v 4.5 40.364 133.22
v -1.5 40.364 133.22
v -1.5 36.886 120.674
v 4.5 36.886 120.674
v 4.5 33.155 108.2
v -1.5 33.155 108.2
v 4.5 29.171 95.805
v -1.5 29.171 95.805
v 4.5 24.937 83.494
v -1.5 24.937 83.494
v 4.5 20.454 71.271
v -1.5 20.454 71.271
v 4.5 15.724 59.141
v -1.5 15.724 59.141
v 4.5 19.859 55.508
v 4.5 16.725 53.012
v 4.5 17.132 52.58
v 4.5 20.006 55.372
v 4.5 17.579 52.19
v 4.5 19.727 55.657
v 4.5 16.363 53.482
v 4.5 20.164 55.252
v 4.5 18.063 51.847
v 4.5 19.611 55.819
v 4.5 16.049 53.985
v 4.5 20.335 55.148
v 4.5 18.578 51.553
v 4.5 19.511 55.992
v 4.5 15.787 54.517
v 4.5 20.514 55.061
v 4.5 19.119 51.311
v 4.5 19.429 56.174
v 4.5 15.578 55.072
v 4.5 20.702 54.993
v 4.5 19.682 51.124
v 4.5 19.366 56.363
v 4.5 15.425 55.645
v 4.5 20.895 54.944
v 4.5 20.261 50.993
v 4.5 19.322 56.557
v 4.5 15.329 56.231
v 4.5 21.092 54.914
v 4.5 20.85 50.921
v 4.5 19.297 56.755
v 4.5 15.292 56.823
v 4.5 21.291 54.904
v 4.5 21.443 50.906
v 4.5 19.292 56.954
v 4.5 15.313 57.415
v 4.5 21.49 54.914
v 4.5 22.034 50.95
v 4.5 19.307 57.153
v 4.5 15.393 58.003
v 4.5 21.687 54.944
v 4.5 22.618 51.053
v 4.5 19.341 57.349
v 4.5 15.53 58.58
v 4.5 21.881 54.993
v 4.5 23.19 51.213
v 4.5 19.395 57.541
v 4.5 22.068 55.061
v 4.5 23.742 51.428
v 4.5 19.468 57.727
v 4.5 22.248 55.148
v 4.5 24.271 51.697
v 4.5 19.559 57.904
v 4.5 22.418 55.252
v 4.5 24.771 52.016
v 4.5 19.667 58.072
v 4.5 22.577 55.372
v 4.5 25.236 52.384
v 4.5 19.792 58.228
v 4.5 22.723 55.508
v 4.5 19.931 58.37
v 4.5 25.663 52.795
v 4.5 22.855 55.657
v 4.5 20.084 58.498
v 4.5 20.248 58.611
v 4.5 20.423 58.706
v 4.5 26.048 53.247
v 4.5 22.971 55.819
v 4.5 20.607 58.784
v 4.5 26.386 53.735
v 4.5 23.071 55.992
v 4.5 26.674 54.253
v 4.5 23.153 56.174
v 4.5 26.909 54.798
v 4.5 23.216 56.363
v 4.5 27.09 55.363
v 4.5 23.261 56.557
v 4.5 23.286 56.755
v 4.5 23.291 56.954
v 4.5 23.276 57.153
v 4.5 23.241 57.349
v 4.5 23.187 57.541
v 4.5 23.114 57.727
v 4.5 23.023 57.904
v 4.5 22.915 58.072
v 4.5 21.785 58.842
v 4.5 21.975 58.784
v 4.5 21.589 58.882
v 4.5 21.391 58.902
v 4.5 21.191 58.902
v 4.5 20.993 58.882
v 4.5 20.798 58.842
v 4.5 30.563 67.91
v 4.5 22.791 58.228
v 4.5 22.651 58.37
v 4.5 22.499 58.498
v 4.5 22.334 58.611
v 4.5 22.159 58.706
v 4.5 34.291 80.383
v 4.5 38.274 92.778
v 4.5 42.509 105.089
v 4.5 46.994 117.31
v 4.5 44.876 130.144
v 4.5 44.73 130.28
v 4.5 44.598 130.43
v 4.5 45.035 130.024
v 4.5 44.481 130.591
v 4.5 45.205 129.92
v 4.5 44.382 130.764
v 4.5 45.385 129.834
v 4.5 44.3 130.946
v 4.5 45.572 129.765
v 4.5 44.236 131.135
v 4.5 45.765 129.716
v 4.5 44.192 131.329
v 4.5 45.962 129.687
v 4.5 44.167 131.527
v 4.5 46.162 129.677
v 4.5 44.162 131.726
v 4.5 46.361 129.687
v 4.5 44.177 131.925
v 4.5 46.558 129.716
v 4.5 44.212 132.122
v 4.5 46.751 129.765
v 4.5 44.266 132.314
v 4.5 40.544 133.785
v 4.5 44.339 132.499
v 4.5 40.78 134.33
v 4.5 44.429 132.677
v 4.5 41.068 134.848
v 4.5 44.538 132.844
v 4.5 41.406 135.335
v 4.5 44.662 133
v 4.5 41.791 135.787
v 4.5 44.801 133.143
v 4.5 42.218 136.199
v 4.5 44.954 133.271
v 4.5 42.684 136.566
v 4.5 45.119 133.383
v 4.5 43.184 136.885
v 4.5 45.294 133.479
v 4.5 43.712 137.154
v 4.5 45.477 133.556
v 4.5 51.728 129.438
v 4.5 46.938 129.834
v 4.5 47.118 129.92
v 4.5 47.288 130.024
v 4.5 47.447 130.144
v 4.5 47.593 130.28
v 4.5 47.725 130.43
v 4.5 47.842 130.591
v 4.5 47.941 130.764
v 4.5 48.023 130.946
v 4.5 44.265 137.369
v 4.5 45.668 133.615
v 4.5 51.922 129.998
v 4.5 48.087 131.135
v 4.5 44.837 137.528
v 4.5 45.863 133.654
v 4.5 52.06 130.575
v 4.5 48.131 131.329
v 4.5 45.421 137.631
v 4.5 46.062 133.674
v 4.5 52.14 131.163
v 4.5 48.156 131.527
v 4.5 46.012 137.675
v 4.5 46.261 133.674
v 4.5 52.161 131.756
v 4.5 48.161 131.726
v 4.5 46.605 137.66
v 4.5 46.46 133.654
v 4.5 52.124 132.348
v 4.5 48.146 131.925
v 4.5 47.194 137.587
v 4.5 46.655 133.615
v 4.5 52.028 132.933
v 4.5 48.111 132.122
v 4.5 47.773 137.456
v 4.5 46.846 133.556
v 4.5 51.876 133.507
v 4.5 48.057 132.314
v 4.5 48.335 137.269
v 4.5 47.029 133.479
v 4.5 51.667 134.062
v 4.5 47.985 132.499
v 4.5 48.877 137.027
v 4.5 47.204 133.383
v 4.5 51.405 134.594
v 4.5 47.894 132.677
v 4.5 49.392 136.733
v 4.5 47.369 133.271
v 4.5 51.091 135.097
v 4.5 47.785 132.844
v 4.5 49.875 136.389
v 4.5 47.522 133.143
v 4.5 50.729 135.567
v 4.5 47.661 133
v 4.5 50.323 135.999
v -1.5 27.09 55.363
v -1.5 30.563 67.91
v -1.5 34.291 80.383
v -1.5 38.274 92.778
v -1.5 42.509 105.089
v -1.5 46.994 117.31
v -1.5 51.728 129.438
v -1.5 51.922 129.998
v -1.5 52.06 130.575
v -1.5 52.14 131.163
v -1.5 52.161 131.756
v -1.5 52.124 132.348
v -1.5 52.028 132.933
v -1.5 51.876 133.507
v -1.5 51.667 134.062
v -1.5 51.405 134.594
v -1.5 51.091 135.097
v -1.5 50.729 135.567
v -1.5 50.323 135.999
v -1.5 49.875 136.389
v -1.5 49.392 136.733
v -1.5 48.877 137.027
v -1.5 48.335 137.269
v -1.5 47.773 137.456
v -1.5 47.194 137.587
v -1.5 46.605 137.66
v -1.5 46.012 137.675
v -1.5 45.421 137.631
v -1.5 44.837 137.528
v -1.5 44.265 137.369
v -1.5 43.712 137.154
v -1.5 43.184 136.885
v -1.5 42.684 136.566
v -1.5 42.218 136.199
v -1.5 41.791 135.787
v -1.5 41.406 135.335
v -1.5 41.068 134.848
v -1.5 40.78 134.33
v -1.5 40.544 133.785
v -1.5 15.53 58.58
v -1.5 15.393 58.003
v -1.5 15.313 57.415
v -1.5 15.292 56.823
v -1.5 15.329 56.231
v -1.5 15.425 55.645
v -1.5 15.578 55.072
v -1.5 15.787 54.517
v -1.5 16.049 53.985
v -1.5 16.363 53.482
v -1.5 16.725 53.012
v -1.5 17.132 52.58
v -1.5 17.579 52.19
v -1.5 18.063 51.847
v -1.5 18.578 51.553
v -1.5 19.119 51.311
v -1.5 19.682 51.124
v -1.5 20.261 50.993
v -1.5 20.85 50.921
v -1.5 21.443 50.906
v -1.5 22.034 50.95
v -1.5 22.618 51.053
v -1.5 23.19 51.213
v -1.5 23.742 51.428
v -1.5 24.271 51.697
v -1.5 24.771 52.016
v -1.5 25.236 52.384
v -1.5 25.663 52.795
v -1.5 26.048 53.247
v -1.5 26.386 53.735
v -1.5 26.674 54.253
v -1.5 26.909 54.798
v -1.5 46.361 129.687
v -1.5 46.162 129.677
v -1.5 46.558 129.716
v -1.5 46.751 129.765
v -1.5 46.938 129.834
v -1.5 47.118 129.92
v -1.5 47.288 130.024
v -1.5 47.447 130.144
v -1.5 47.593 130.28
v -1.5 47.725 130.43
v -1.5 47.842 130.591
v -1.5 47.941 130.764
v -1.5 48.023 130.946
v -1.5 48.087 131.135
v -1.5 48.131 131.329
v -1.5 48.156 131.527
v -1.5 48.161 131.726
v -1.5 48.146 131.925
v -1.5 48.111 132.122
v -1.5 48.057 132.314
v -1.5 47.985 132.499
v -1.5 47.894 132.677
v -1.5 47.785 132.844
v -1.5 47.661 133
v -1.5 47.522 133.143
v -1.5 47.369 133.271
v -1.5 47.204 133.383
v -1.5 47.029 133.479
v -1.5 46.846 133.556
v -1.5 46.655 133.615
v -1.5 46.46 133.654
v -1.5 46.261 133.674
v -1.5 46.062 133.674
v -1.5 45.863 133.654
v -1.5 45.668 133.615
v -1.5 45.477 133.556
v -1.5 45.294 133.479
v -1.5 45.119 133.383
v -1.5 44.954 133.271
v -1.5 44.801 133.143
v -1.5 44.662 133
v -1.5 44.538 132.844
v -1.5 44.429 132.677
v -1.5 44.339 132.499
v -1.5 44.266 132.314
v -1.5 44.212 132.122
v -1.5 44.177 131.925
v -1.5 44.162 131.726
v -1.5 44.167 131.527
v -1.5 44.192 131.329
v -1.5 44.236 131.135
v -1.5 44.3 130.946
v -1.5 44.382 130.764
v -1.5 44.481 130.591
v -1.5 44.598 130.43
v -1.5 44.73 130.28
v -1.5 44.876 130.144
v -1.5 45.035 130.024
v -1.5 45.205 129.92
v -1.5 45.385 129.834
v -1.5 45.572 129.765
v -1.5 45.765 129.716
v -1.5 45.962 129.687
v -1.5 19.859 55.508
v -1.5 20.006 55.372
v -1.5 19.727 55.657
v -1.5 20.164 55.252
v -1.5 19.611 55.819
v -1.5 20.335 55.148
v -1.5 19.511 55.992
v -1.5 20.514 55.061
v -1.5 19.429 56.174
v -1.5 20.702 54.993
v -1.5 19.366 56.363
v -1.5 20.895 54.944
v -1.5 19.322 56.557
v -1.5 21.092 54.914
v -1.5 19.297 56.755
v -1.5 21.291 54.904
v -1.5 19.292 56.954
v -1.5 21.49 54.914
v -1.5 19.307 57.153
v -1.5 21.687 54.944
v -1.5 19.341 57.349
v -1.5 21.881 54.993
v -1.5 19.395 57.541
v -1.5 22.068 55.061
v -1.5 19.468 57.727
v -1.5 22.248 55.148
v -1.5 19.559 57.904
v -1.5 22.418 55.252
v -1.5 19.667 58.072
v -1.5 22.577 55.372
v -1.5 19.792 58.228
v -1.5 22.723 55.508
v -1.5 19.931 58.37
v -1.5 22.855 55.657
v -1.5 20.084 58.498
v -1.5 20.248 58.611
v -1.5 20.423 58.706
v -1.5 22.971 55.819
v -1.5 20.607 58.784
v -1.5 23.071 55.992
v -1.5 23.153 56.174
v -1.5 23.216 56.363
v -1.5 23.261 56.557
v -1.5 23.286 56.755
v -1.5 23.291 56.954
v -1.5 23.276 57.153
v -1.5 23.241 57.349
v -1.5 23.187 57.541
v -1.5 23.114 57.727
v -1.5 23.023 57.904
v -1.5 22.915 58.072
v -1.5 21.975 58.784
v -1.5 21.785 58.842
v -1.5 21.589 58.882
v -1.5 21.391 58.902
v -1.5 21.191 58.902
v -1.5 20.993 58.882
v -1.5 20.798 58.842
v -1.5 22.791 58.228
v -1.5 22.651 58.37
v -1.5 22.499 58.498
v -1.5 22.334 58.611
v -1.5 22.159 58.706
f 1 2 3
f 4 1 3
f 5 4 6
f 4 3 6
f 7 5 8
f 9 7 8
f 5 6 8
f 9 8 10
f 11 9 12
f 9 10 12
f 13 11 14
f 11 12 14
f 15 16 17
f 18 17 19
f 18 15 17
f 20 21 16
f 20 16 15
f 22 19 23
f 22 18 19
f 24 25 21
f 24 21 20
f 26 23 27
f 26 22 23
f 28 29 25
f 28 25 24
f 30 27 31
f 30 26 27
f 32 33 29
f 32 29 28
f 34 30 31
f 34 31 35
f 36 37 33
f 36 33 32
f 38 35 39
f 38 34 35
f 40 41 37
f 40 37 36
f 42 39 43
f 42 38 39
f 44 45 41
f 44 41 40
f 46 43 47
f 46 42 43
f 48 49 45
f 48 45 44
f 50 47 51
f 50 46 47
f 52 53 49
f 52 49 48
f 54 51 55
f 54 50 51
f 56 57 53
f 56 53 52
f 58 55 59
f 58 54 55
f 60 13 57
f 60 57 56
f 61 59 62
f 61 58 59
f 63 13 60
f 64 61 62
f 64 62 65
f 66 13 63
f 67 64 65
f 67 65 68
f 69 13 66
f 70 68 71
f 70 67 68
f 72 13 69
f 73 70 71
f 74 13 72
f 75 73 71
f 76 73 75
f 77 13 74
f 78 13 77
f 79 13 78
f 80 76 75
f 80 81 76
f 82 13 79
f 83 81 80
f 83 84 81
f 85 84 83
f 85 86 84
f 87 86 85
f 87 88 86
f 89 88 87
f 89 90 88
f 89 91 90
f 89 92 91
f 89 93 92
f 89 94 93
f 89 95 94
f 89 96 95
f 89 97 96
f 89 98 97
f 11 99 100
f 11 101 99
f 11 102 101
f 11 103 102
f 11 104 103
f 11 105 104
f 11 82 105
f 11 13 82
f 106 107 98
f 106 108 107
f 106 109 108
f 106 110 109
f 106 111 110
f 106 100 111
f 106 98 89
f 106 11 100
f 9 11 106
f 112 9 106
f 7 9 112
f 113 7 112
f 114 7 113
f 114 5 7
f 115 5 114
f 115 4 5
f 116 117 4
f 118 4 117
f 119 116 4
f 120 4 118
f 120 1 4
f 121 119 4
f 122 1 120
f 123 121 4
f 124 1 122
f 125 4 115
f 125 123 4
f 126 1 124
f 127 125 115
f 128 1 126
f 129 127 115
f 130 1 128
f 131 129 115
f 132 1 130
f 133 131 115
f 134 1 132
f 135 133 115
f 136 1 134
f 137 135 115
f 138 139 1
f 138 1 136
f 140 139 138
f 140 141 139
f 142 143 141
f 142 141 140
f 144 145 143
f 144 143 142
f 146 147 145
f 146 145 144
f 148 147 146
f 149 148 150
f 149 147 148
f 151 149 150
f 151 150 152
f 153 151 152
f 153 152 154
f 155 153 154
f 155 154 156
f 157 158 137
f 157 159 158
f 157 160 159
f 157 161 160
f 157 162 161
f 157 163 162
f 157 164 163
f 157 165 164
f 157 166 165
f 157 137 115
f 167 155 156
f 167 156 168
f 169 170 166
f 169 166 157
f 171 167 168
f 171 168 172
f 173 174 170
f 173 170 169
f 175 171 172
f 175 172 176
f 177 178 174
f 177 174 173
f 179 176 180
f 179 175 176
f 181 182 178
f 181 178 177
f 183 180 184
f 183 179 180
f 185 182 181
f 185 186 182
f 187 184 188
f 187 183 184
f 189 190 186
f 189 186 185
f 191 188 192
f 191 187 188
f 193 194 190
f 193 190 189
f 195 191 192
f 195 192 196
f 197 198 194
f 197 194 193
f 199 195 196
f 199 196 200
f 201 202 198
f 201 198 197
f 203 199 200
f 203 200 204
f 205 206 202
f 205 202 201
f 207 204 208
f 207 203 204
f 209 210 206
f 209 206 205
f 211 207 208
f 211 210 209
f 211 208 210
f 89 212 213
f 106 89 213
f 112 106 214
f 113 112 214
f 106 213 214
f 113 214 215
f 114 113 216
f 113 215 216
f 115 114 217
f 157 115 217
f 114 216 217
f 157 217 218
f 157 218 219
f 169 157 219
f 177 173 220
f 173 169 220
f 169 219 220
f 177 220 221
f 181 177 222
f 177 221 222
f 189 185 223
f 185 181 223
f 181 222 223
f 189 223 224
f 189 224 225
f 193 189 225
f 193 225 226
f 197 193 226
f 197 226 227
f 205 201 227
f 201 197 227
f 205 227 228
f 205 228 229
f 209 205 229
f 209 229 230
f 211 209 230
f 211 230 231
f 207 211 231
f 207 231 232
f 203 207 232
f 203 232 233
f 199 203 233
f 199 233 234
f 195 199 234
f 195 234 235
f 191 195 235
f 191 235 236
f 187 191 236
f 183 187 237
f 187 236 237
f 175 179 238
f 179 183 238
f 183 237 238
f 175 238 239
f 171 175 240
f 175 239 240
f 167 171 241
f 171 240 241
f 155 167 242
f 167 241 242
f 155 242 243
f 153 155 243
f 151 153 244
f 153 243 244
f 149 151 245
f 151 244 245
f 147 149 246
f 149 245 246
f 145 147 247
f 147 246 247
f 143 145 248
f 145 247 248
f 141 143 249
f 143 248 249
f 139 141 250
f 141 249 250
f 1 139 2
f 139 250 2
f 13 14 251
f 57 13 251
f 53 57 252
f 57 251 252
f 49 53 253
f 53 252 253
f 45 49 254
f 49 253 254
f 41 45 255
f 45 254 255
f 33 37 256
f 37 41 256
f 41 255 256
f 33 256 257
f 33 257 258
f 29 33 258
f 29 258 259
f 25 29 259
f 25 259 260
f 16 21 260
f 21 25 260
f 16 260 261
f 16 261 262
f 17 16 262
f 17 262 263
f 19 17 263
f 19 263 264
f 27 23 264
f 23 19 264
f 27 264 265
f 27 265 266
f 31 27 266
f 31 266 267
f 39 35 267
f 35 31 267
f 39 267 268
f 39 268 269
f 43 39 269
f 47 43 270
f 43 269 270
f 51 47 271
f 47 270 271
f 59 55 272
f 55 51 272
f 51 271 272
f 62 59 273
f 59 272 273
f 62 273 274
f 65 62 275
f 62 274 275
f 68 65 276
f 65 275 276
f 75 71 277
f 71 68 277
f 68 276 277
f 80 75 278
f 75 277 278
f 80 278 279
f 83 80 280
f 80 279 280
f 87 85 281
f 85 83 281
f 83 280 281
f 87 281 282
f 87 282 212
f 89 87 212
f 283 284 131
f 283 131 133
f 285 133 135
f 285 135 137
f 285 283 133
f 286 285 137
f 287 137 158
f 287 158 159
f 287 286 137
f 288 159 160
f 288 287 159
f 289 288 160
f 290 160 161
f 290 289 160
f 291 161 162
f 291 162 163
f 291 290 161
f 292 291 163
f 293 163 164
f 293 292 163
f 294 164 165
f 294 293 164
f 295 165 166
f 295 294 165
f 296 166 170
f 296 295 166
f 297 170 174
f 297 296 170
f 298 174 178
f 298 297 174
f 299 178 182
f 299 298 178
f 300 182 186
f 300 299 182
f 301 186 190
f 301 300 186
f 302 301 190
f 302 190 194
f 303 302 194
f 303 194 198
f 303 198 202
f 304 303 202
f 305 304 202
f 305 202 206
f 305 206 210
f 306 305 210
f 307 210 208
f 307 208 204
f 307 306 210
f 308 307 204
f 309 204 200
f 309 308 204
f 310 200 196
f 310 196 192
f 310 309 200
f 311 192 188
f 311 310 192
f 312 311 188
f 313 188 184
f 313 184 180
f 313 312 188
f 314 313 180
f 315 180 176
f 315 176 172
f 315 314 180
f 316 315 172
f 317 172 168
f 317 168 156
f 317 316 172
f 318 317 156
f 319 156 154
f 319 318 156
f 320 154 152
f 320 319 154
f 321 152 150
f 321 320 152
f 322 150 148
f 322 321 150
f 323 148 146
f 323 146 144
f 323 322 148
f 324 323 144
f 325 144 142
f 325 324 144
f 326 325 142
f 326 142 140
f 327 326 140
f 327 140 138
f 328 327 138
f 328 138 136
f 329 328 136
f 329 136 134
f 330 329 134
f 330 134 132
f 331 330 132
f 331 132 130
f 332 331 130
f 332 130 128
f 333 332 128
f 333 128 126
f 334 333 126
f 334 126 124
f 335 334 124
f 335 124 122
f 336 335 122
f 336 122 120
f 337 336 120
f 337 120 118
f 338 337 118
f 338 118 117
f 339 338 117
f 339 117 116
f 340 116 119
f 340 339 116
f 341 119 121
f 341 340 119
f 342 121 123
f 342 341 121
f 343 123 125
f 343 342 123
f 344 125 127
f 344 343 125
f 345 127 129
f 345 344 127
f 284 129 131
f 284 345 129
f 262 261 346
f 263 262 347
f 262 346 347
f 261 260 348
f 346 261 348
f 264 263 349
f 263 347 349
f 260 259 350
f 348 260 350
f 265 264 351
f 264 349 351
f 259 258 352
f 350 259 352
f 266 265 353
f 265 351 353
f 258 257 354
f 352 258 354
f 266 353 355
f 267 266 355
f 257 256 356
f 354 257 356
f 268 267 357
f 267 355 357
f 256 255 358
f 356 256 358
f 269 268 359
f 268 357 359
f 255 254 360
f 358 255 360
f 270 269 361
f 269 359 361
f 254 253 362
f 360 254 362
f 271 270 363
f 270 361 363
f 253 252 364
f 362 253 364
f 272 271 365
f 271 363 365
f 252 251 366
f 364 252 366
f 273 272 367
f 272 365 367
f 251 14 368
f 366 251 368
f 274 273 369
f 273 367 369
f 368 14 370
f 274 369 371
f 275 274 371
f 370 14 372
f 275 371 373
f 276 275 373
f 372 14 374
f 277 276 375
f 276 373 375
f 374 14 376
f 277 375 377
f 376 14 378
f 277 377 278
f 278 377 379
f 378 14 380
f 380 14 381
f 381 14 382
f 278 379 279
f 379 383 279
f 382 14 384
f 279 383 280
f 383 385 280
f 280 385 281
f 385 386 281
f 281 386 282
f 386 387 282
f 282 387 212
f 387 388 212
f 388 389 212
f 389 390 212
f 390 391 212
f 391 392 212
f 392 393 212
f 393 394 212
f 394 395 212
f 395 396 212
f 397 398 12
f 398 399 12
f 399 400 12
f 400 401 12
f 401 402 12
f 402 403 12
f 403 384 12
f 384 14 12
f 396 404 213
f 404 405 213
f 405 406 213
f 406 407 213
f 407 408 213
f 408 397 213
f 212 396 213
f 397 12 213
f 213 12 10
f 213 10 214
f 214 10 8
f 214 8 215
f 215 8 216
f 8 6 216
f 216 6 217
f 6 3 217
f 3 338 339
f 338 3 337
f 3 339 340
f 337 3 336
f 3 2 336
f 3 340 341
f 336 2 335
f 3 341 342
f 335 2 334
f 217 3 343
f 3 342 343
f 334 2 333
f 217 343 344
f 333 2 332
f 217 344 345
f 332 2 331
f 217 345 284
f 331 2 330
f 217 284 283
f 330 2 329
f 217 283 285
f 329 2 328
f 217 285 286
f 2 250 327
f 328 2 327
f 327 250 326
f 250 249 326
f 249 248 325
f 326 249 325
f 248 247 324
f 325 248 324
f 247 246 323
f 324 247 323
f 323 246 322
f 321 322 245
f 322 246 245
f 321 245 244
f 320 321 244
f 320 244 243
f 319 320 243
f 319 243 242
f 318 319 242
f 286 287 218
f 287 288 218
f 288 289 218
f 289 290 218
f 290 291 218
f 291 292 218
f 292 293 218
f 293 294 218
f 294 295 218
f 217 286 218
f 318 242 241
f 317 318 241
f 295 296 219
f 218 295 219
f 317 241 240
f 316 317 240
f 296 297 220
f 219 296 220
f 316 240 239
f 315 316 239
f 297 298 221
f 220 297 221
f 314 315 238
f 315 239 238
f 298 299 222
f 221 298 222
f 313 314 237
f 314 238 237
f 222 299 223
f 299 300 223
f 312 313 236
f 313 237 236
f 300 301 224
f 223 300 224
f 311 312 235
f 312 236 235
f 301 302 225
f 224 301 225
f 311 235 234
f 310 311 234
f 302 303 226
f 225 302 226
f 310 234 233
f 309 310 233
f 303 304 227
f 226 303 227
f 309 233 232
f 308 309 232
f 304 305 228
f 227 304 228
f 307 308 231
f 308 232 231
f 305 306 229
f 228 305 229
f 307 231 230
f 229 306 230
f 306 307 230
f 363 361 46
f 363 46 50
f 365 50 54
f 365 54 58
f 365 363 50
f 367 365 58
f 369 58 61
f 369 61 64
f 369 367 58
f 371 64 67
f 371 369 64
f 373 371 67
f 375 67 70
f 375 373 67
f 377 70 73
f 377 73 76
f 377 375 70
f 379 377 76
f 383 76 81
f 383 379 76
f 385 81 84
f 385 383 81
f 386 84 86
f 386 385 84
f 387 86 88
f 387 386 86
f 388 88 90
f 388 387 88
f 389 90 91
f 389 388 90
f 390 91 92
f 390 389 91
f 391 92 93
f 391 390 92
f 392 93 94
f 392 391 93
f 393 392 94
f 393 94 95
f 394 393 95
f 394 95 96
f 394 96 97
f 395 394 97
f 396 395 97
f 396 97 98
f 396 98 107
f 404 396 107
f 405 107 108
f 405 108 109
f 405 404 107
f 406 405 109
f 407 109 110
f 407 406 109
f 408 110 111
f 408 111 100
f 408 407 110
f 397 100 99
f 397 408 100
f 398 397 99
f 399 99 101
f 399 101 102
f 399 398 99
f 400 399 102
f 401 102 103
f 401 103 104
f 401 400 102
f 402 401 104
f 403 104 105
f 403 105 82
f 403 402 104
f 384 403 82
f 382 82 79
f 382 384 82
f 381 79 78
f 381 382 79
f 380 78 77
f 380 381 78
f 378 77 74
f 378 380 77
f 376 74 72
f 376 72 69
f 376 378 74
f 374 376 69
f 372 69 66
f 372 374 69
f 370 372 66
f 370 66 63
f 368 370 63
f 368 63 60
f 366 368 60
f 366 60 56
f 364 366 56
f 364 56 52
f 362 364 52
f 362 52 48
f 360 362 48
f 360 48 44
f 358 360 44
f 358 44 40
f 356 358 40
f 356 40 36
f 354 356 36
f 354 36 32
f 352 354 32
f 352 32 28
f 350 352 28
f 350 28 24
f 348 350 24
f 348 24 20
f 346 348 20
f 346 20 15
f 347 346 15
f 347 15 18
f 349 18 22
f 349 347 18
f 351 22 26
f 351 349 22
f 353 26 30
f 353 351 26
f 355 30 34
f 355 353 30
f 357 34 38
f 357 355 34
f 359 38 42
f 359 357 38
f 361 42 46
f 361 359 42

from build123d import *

# Parameters (mm, degrees)
SKETCH2_R               = 1
BOSS_EXTRUDE2_DEPTH     = 3
SCALE1_SCALE            = 2
CUT_EXTRUDE1_DEPTH      = 166.58723061
CUT_EXTRUDE1_DEPTH_BACK = 166.58723061


with BuildPart() as part:
    # Sketch2 → Boss-Extrude2 (new body)
    with BuildSketch(Plane.YZ):
        with BuildLine():
            ThreePointArc((19.533132157, 81.629722684), (24.352585485, 66.108442404), (37.508583242, 75.650821296))
            ThreePointArc((37.508583242, 75.650821296), (40.136593734, 92.158254486), (47.919515666, 106.951087747))
            ThreePointArc((47.919515666, 106.951087747), (43.100062338, 122.472368027), (29.944064581, 112.929989135))
            ThreePointArc((29.944064581, 112.929989135), (27.316054088, 96.422555945), (19.533132157, 81.629722684))
        make_face()
        with Locations(Location((39.943921454, 112.983491659, 0), (0, 0, 270))):
            Circle(SKETCH2_R, mode=Mode.SUBTRACT)
        with Locations(Location((27.508726369, 75.597318771, 0), (0, 0, 270))):
            Circle(SKETCH2_R, mode=Mode.SUBTRACT)
    extrude(amount=BOSS_EXTRUDE2_DEPTH)


with BuildPart() as part_1:
    # Scale1: scaled about (1.5, 33.726323911, 94.290405215)
    add(part.part.scale(SCALE1_SCALE).moved(Location((-1.5, -33.726323911, -94.290405215))))

    # Sketch3 → Cut-Extrude1 (cut, two sides: drawn at the far end of the back side and taken through both)
    # profile 1 of 2: a face of its own
    with BuildSketch(Plane.YZ.offset(4.5).offset(-CUT_EXTRUDE1_DEPTH_BACK)):
        with BuildLine():
            ThreePointArc((70.088301632, 113.579366365), (56.035739925, 86.869962872), (51.290699446, 57.064739901))
            ThreePointArc((51.290699446, 57.064739901), (11.822706174, 28.437603225), (-2.635653809, 75.001444065))
            ThreePointArc((-2.635653809, 75.001444065), (11.416907898, 101.710847558), (16.161948377, 131.516070529))
            ThreePointArc((16.161948377, 131.516070529), (55.629941649, 160.143207206), (70.088301632, 113.579366365))
        make_face()
        with BuildLine():
            ThreePointArc((26.16180525, 131.569573054), (20.905784266, 98.554706674), (5.339940403, 68.969040153))
            ThreePointArc((5.339940403, 68.969040153), (14.978847058, 37.926479592), (41.290842573, 57.011237377))
            ThreePointArc((41.290842573, 57.011237377), (46.546863557, 90.026103756), (62.11270742, 119.611770278))
            ThreePointArc((62.11270742, 119.611770278), (52.473800765, 150.654330838), (26.16180525, 131.569573054))
        make_face(mode=Mode.SUBTRACT)
    # profile 2 of 2: a face of its own
    with BuildSketch(Plane.YZ.offset(4.5).offset(-CUT_EXTRUDE1_DEPTH_BACK)):
        with BuildLine():
            ThreePointArc((62.11270742, 119.611770278), (52.473800765, 150.654330838), (26.16180525, 131.569573054))
            ThreePointArc((26.16180525, 131.569573054), (20.905784266, 98.554706674), (5.339940403, 68.969040153))
            ThreePointArc((5.339940403, 68.969040153), (14.978847058, 37.926479592), (41.290842573, 57.011237377))
            ThreePointArc((41.290842573, 57.011237377), (46.546863557, 90.026103756), (62.11270742, 119.611770278))
        make_face()
        with BuildLine():
            ThreePointArc((15.723577438, 59.140830534), (19.398551743, 51.210538273), (27.089730835, 55.362734759))
            ThreePointArc((27.089730835, 55.362734759), (38.273895697, 92.777815454), (51.72819988, 129.437814172))
            ThreePointArc((51.72819988, 129.437814172), (48.056310902, 137.369535475), (40.363517101, 133.220331331))
            ThreePointArc((40.363517101, 133.220331331), (29.171473339, 95.805416009), (15.723577438, 59.140830534))
        make_face(mode=Mode.SUBTRACT)
    extrude(amount=CUT_EXTRUDE1_DEPTH + CUT_EXTRUDE1_DEPTH_BACK, mode=Mode.SUBTRACT)


solid = part_1.part
